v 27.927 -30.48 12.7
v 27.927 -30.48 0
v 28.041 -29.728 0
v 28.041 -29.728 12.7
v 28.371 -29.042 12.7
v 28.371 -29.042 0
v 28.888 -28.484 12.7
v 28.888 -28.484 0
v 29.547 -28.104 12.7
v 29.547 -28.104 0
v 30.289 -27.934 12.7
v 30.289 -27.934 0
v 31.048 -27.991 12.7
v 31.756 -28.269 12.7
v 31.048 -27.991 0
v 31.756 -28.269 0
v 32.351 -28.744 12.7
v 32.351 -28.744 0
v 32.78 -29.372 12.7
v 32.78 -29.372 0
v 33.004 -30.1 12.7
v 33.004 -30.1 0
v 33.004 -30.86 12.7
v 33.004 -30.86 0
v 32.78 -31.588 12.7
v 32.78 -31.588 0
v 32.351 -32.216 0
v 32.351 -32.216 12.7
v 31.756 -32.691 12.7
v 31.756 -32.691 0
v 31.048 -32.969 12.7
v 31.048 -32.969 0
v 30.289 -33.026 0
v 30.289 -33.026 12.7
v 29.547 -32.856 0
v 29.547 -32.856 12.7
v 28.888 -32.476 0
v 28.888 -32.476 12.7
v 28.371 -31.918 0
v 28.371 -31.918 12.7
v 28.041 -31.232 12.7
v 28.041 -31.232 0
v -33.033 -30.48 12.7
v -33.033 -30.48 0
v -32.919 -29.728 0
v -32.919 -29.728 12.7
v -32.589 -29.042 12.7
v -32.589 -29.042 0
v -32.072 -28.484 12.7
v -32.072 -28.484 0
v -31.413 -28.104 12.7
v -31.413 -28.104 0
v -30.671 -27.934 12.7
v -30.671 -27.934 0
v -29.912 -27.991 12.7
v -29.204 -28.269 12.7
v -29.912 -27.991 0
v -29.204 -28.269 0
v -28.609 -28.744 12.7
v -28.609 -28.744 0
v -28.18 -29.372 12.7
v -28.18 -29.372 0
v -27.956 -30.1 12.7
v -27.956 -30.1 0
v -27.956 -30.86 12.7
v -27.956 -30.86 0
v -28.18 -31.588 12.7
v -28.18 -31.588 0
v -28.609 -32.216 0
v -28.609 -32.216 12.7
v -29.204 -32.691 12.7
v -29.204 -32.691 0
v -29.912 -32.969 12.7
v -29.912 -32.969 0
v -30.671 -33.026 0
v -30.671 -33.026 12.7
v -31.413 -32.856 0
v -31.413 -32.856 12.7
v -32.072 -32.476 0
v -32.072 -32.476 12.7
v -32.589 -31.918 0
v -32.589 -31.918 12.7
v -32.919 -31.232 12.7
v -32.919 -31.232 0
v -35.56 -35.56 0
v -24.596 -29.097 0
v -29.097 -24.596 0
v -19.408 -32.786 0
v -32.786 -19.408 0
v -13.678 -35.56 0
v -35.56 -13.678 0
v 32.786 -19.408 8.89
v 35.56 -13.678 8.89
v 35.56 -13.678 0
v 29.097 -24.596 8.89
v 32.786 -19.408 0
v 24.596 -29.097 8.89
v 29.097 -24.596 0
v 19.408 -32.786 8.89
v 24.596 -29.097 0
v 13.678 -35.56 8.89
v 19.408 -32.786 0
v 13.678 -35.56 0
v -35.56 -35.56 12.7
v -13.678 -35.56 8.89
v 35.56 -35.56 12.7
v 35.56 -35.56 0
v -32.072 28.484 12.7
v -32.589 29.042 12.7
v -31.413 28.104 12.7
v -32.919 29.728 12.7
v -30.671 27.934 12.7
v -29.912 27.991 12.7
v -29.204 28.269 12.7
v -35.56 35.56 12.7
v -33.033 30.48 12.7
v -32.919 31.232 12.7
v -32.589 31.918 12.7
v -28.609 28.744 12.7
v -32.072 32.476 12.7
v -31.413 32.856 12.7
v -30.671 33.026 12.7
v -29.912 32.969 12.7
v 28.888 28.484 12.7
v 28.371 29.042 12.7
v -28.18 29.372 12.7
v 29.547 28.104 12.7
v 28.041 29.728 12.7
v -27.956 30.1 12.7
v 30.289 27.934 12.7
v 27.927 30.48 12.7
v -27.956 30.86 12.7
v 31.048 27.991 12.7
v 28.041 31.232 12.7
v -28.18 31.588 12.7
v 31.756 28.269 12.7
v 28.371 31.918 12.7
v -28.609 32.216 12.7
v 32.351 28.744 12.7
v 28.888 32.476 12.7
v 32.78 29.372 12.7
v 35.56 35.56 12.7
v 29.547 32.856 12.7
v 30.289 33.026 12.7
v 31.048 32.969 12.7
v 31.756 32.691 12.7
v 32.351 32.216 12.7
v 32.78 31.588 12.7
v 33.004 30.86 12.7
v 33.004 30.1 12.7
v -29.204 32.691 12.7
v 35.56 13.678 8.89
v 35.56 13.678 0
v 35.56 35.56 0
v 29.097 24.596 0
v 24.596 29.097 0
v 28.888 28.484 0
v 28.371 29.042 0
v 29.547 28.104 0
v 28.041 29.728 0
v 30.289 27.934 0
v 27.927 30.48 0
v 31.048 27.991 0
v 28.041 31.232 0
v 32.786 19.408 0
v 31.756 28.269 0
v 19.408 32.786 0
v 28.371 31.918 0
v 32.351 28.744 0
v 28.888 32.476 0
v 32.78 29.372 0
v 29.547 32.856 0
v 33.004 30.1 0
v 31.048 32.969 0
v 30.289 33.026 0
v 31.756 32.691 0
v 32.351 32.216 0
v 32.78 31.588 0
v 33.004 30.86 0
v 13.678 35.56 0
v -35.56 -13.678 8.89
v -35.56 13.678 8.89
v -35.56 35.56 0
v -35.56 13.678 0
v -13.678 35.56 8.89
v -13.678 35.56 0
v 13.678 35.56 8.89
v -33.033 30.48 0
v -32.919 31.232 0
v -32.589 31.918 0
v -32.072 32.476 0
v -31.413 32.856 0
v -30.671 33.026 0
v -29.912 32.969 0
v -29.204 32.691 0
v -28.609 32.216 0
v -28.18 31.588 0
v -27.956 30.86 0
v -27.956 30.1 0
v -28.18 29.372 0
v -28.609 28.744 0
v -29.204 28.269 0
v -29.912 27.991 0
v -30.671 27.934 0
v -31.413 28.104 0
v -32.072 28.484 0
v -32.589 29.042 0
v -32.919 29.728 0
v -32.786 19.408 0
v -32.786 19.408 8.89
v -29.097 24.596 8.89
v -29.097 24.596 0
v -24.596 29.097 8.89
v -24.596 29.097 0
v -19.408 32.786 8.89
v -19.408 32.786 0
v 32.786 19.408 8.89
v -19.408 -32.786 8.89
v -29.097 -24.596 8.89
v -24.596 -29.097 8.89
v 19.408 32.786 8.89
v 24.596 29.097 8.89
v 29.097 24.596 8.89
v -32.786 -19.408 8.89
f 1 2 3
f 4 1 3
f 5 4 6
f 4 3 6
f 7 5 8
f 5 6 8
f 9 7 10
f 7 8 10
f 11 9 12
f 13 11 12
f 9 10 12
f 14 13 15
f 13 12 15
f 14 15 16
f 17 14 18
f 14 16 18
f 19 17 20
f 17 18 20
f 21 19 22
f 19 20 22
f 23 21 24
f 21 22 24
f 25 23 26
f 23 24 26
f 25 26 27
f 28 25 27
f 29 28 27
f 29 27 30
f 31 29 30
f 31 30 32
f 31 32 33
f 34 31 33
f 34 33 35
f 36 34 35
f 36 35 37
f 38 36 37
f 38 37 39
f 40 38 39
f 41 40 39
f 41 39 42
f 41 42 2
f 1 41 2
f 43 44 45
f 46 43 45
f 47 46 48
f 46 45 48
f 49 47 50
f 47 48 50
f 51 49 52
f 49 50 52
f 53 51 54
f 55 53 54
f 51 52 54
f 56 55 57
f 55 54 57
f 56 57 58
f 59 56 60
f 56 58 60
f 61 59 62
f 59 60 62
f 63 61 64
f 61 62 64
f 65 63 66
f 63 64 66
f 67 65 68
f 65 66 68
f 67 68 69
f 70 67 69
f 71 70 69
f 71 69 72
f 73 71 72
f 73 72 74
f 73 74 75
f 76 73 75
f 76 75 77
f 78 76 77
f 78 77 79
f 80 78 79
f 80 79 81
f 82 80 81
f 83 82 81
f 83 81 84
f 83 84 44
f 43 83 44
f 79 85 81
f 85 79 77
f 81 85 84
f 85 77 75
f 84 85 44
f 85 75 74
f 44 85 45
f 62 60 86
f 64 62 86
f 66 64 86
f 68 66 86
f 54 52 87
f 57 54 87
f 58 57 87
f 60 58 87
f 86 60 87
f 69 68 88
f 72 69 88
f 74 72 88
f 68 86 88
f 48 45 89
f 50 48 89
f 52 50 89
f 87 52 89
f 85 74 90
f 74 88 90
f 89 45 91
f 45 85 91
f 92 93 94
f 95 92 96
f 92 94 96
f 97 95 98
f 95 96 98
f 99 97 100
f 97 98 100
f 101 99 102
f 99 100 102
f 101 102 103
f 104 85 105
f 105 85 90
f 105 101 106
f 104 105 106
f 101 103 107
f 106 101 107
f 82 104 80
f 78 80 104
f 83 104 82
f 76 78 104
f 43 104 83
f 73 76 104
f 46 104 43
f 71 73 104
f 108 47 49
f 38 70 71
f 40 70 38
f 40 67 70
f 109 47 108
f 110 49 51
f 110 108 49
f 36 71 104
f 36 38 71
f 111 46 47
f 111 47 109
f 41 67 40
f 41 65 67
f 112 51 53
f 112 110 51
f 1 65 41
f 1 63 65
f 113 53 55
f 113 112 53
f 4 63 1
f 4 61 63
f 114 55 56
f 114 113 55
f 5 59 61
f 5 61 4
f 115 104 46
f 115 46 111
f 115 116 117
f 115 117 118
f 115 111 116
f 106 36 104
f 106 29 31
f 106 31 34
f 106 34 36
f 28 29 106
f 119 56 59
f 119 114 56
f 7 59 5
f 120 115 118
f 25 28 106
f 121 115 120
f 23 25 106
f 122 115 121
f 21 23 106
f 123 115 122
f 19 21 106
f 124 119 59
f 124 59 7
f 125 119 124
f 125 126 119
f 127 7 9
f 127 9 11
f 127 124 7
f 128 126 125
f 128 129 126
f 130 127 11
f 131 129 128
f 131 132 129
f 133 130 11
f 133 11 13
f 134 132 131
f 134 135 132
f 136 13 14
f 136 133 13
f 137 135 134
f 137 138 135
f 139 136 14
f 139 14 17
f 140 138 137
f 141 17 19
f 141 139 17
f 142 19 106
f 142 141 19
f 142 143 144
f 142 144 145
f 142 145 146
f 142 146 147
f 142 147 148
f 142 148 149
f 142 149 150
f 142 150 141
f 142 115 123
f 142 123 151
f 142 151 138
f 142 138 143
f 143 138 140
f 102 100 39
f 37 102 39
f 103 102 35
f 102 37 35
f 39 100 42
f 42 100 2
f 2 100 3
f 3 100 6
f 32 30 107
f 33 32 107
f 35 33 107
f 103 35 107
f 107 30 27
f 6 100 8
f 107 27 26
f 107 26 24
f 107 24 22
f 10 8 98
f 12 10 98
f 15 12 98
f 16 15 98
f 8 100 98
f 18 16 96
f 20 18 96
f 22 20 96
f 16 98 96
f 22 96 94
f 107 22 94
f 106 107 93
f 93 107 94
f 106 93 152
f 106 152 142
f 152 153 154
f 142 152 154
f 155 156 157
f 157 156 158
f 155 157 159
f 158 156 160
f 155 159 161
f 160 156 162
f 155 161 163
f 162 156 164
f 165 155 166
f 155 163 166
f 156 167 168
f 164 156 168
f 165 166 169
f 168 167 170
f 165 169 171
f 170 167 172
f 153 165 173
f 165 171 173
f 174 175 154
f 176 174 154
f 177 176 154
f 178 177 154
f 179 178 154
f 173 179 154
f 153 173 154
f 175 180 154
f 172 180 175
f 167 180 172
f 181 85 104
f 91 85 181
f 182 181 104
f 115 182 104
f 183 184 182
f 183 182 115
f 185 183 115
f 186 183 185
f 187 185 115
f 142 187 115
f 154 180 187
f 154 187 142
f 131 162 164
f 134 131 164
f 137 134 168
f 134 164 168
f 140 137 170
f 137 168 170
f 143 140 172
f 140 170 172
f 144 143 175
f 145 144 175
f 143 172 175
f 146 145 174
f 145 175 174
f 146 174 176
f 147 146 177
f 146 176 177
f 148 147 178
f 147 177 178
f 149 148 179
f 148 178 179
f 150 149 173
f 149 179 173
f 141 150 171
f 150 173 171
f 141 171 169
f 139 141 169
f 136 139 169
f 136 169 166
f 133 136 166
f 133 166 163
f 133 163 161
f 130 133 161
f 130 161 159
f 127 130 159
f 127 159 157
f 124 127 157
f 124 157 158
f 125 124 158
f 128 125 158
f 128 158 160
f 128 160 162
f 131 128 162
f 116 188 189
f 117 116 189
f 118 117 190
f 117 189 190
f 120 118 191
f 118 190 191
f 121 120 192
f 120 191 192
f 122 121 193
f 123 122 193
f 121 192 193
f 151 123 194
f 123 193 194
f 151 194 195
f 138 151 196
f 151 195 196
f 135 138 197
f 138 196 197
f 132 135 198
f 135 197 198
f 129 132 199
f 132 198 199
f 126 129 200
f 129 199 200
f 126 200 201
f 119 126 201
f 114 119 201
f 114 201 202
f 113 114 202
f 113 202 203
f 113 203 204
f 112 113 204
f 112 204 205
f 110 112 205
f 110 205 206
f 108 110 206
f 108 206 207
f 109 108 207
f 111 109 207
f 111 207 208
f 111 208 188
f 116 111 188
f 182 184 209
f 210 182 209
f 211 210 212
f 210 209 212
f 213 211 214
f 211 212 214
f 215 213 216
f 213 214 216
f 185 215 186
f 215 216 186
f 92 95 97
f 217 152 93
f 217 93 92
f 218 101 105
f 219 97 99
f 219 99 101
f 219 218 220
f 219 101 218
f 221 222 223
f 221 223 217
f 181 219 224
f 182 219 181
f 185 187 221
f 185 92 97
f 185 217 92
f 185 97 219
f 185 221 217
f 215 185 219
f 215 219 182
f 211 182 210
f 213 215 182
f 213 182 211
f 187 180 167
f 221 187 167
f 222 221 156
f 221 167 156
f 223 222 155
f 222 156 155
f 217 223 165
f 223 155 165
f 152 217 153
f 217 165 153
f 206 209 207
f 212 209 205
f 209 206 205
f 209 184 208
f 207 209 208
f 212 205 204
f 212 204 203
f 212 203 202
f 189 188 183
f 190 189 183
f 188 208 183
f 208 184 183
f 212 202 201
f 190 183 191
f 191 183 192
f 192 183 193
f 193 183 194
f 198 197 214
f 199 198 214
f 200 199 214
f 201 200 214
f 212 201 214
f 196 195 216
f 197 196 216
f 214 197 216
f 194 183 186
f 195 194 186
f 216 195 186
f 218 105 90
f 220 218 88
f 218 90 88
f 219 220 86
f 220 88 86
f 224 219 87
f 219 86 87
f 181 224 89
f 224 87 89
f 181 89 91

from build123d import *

# Parameters (mm, degrees)
SKETCH1_W                      = 71.12
SKETCH1_H                      = 71.12
BOSS_EXTRUDE1_DEPTH            = 12.7
SKETCH2_R                      = 38.1
CUT_EXTRUDE1_DEPTH             = 8.89
F_7_0_201_DIAMETER_HOLE1_D     = 5.1054
F_7_0_201_DIAMETER_HOLE1_DEPTH = 31.75
F_7_0_201_DIAMETER_HOLE1_TIP   = 1.533816902


with BuildPart() as part:
    # Sketch1 → Boss-Extrude1 (new body)
    with BuildSketch(Plane.XY):
        Rectangle(SKETCH1_W, SKETCH1_H)
    extrude(amount=BOSS_EXTRUDE1_DEPTH)

    # Sketch2 → Cut-Extrude1 (cut)
    with BuildSketch(Plane(origin=(0, 0, 0), x_dir=(-1, 0, 0), z_dir=(0, 0, -1))):
        Circle(SKETCH2_R)
    extrude(amount=-CUT_EXTRUDE1_DEPTH, mode=Mode.SUBTRACT)

    # #7 (0.201) Diameter Hole1
    with Locations(Plane.XY.offset(12.7)):
        with Locations((30.48, 30.48), (-30.48, 30.48), (-30.48, -30.48), (30.48, -30.48)):
            Hole(F_7_0_201_DIAMETER_HOLE1_D / 2, depth=F_7_0_201_DIAMETER_HOLE1_DEPTH)
            with Locations((0, 0, -(F_7_0_201_DIAMETER_HOLE1_DEPTH + F_7_0_201_DIAMETER_HOLE1_TIP / 2))):  # 118° drill point
                Cone(0, F_7_0_201_DIAMETER_HOLE1_D / 2, F_7_0_201_DIAMETER_HOLE1_TIP, mode=Mode.SUBTRACT)


solid = part.part
